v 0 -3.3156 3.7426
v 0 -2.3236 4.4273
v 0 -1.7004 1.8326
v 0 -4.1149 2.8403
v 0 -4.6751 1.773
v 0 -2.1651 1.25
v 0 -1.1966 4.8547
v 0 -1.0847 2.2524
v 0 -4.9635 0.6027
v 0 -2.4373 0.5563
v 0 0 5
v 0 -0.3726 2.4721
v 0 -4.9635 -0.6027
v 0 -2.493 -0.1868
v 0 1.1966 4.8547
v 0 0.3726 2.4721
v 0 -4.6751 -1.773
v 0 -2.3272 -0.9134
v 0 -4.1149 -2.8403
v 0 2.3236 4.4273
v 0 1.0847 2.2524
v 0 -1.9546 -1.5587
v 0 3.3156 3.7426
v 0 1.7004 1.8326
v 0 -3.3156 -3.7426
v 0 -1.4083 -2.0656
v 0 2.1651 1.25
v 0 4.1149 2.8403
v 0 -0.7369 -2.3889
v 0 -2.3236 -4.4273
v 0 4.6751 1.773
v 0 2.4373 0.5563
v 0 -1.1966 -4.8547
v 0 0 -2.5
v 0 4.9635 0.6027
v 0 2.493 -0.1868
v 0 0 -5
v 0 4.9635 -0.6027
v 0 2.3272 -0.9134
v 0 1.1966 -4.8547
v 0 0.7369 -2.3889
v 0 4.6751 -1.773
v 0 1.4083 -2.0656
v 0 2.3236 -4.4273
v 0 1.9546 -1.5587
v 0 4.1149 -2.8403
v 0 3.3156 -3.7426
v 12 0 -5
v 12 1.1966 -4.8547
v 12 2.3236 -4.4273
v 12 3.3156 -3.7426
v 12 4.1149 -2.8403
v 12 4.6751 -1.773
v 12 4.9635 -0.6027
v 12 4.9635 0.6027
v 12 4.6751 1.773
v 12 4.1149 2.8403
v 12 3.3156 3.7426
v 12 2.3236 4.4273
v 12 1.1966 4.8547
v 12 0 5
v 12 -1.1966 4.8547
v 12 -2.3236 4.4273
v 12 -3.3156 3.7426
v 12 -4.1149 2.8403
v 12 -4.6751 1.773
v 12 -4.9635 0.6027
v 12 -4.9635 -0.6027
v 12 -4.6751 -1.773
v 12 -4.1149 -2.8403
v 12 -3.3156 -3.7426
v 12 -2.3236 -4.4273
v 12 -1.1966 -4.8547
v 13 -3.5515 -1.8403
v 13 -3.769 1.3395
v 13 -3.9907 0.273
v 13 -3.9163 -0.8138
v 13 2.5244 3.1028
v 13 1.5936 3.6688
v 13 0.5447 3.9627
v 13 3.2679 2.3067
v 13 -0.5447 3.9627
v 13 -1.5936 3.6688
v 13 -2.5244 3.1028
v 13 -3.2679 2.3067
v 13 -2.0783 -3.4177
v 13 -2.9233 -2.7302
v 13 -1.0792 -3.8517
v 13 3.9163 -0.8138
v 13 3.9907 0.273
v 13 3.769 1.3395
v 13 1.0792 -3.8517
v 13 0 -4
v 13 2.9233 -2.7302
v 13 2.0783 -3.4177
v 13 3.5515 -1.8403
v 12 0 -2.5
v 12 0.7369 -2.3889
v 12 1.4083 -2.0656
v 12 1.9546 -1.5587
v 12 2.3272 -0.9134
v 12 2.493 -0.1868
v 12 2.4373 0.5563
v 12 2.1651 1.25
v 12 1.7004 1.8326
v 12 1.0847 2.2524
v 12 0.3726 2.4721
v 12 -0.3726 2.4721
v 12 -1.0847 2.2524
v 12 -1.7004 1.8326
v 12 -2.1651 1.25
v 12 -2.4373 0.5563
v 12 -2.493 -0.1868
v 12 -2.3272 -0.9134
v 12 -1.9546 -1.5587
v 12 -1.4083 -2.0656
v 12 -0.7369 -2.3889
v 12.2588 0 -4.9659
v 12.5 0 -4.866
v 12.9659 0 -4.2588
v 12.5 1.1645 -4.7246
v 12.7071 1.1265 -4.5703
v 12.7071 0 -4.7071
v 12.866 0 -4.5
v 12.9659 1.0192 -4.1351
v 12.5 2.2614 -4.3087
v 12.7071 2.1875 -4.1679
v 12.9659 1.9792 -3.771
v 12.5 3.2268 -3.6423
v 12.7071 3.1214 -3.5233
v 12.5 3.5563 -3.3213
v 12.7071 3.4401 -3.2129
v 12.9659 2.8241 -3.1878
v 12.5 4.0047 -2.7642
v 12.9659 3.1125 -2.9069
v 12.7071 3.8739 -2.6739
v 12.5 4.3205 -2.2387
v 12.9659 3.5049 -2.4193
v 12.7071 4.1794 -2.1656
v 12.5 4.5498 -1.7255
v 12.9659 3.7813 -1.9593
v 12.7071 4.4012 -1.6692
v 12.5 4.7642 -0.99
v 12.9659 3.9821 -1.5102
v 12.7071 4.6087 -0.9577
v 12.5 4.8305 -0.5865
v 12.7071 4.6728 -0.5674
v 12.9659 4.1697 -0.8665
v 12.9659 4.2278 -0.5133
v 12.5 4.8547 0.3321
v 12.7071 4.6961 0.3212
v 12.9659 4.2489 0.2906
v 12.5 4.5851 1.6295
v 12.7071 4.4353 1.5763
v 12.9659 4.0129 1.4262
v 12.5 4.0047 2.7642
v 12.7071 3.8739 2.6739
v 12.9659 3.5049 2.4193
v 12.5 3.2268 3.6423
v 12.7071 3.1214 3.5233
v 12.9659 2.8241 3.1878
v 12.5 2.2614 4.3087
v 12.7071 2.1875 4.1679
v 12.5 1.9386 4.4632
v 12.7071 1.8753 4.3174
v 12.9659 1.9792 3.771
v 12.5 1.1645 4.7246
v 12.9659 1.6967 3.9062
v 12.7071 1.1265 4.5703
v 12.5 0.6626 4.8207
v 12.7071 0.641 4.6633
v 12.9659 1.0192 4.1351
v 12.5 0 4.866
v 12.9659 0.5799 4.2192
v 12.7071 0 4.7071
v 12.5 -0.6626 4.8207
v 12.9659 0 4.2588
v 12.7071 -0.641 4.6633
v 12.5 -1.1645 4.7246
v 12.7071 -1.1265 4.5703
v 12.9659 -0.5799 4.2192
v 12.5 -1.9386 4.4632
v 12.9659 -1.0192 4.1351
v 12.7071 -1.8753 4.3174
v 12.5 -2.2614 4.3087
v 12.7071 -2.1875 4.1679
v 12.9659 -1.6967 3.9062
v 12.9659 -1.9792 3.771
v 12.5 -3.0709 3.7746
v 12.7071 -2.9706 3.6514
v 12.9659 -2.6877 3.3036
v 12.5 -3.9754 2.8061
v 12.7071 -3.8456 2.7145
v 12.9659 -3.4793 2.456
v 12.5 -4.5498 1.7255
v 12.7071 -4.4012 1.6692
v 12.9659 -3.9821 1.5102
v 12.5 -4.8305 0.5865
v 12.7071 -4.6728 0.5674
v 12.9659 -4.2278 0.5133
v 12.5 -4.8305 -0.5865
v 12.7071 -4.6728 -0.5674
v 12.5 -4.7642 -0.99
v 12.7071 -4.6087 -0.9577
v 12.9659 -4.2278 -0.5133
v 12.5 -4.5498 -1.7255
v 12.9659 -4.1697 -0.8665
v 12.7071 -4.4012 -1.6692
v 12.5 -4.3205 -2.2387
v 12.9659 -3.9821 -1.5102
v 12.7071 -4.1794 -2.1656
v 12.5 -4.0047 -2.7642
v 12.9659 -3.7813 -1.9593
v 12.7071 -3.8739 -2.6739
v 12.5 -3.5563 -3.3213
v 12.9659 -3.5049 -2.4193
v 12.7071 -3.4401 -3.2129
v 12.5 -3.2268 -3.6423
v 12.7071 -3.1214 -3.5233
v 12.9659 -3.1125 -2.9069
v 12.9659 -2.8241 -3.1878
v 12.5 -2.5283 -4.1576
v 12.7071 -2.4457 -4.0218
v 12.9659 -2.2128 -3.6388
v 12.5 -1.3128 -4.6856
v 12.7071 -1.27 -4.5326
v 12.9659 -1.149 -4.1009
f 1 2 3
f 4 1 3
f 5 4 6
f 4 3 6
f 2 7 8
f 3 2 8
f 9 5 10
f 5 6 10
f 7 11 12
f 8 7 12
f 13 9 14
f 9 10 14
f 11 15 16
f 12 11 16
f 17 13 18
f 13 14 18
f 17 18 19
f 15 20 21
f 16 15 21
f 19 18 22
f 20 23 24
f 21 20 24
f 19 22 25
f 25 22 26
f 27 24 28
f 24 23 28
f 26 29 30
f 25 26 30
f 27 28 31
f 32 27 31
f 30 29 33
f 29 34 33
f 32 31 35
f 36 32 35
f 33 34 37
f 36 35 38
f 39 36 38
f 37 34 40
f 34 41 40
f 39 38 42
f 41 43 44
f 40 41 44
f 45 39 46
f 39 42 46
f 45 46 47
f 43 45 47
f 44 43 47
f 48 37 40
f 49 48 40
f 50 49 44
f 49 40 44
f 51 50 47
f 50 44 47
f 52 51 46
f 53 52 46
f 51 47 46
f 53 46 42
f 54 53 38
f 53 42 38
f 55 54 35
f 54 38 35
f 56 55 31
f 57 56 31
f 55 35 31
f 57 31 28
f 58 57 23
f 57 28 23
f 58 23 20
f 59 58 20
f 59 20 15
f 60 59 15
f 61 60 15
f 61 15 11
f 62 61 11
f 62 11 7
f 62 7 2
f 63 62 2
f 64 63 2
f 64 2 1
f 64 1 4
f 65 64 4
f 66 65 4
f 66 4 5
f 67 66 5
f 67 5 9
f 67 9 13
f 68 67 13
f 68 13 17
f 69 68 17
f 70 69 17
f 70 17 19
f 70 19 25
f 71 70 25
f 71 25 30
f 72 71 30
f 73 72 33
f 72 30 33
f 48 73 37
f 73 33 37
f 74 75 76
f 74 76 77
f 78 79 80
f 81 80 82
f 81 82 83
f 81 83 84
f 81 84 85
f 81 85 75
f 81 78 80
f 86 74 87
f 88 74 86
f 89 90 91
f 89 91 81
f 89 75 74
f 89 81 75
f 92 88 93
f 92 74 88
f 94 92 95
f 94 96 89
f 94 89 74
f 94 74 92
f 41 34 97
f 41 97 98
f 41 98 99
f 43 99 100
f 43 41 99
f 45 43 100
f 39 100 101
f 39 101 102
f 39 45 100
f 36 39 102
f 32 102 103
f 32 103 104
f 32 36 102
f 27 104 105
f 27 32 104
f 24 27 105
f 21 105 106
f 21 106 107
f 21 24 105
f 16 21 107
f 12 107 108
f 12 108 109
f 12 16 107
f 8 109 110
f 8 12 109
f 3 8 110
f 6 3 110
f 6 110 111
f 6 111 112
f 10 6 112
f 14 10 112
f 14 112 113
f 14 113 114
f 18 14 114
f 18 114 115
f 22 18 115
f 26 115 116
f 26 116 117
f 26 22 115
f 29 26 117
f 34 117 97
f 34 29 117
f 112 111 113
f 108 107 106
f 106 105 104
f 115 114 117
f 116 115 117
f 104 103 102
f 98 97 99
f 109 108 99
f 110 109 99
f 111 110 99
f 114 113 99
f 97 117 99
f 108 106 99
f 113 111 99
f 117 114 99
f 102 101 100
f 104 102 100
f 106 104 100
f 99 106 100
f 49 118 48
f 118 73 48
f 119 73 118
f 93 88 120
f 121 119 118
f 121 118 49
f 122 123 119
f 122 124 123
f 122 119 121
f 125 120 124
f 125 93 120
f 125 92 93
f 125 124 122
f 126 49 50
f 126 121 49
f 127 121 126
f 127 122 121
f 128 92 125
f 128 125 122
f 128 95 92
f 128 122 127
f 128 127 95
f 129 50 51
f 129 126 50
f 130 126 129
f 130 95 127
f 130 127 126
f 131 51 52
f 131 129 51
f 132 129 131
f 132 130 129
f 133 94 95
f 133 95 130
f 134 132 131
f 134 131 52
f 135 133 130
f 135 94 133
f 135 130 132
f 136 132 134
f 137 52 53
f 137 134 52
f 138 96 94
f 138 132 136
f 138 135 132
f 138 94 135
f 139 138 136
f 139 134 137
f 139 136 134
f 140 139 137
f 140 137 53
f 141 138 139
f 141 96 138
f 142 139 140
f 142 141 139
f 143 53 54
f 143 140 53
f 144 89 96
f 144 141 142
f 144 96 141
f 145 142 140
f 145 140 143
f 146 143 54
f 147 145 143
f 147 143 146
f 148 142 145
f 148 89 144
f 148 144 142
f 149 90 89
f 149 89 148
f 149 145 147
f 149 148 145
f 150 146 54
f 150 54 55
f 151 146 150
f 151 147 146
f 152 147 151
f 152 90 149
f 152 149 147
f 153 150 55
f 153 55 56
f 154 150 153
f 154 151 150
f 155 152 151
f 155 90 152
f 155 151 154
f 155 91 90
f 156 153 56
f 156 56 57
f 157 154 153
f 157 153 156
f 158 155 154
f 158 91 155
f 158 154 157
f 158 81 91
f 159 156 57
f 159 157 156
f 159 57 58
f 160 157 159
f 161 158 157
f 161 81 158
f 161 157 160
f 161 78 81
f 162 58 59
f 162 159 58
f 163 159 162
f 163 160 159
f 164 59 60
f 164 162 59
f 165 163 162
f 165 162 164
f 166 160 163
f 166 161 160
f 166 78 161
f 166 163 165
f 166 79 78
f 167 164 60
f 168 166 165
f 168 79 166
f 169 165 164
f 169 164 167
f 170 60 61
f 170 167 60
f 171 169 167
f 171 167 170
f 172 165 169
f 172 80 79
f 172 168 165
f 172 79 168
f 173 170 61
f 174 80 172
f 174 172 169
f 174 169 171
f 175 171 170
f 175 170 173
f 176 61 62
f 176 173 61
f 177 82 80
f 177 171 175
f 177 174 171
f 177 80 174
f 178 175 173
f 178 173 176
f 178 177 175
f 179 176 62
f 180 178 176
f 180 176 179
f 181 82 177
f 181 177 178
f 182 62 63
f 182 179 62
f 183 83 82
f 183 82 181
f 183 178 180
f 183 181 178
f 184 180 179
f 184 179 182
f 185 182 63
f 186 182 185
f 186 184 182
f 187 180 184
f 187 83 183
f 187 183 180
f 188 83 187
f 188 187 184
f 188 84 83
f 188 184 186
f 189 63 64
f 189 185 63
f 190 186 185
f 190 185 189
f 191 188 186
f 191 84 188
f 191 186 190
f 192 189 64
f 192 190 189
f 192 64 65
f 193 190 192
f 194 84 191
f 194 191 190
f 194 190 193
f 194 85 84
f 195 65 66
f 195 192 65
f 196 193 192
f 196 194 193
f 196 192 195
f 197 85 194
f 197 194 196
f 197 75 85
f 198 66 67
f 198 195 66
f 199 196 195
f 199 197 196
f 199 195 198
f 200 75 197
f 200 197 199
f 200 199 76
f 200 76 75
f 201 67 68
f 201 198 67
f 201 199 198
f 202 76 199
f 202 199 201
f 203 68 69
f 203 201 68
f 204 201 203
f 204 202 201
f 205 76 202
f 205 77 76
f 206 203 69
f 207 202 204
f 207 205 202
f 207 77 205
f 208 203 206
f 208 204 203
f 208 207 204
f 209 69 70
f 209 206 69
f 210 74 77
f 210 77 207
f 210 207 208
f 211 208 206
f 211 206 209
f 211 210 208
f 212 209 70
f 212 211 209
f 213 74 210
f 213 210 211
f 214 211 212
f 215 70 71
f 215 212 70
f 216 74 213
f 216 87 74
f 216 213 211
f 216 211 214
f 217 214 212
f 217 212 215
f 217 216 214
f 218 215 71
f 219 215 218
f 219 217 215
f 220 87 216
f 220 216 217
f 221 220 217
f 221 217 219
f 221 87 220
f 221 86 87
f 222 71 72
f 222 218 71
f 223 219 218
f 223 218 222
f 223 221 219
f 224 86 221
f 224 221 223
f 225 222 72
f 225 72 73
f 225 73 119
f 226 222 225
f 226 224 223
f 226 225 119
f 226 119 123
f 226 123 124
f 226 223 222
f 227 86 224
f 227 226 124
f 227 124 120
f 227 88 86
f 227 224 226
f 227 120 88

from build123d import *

# Parameters (mm, degrees)
SKETCH1_R           = 5
SKETCH1_R_2         = 2.5
BOSS_EXTRUDE1_DEPTH = 12
SKETCH2_R           = 5
BOSS_EXTRUDE2_DEPTH = 1
FILLET1_R           = 1


with BuildPart() as part:
    # Sketch1 → Boss-Extrude1 (new body)
    with BuildSketch(Plane(origin=(0, 0, 0), x_dir=(0, 0, -1), z_dir=(1, 0, 0))):
        Circle(SKETCH1_R)
        Circle(SKETCH1_R_2, mode=Mode.SUBTRACT)
    extrude(amount=BOSS_EXTRUDE1_DEPTH)

    # Sketch2 → Boss-Extrude2 (add)
    with BuildSketch(Plane(origin=(12, 0, 0), x_dir=(0, 0, -1), z_dir=(1, 0, 0))):
        Circle(SKETCH2_R)
    extrude(amount=BOSS_EXTRUDE2_DEPTH)

    # Fillet1
    fillet1_edges = [part.edges().sort_by_distance(p)[0] for p in [
        (13, 0, 5),
    ]]
    fillet(fillet1_edges, radius=FILLET1_R)


solid = part.part
